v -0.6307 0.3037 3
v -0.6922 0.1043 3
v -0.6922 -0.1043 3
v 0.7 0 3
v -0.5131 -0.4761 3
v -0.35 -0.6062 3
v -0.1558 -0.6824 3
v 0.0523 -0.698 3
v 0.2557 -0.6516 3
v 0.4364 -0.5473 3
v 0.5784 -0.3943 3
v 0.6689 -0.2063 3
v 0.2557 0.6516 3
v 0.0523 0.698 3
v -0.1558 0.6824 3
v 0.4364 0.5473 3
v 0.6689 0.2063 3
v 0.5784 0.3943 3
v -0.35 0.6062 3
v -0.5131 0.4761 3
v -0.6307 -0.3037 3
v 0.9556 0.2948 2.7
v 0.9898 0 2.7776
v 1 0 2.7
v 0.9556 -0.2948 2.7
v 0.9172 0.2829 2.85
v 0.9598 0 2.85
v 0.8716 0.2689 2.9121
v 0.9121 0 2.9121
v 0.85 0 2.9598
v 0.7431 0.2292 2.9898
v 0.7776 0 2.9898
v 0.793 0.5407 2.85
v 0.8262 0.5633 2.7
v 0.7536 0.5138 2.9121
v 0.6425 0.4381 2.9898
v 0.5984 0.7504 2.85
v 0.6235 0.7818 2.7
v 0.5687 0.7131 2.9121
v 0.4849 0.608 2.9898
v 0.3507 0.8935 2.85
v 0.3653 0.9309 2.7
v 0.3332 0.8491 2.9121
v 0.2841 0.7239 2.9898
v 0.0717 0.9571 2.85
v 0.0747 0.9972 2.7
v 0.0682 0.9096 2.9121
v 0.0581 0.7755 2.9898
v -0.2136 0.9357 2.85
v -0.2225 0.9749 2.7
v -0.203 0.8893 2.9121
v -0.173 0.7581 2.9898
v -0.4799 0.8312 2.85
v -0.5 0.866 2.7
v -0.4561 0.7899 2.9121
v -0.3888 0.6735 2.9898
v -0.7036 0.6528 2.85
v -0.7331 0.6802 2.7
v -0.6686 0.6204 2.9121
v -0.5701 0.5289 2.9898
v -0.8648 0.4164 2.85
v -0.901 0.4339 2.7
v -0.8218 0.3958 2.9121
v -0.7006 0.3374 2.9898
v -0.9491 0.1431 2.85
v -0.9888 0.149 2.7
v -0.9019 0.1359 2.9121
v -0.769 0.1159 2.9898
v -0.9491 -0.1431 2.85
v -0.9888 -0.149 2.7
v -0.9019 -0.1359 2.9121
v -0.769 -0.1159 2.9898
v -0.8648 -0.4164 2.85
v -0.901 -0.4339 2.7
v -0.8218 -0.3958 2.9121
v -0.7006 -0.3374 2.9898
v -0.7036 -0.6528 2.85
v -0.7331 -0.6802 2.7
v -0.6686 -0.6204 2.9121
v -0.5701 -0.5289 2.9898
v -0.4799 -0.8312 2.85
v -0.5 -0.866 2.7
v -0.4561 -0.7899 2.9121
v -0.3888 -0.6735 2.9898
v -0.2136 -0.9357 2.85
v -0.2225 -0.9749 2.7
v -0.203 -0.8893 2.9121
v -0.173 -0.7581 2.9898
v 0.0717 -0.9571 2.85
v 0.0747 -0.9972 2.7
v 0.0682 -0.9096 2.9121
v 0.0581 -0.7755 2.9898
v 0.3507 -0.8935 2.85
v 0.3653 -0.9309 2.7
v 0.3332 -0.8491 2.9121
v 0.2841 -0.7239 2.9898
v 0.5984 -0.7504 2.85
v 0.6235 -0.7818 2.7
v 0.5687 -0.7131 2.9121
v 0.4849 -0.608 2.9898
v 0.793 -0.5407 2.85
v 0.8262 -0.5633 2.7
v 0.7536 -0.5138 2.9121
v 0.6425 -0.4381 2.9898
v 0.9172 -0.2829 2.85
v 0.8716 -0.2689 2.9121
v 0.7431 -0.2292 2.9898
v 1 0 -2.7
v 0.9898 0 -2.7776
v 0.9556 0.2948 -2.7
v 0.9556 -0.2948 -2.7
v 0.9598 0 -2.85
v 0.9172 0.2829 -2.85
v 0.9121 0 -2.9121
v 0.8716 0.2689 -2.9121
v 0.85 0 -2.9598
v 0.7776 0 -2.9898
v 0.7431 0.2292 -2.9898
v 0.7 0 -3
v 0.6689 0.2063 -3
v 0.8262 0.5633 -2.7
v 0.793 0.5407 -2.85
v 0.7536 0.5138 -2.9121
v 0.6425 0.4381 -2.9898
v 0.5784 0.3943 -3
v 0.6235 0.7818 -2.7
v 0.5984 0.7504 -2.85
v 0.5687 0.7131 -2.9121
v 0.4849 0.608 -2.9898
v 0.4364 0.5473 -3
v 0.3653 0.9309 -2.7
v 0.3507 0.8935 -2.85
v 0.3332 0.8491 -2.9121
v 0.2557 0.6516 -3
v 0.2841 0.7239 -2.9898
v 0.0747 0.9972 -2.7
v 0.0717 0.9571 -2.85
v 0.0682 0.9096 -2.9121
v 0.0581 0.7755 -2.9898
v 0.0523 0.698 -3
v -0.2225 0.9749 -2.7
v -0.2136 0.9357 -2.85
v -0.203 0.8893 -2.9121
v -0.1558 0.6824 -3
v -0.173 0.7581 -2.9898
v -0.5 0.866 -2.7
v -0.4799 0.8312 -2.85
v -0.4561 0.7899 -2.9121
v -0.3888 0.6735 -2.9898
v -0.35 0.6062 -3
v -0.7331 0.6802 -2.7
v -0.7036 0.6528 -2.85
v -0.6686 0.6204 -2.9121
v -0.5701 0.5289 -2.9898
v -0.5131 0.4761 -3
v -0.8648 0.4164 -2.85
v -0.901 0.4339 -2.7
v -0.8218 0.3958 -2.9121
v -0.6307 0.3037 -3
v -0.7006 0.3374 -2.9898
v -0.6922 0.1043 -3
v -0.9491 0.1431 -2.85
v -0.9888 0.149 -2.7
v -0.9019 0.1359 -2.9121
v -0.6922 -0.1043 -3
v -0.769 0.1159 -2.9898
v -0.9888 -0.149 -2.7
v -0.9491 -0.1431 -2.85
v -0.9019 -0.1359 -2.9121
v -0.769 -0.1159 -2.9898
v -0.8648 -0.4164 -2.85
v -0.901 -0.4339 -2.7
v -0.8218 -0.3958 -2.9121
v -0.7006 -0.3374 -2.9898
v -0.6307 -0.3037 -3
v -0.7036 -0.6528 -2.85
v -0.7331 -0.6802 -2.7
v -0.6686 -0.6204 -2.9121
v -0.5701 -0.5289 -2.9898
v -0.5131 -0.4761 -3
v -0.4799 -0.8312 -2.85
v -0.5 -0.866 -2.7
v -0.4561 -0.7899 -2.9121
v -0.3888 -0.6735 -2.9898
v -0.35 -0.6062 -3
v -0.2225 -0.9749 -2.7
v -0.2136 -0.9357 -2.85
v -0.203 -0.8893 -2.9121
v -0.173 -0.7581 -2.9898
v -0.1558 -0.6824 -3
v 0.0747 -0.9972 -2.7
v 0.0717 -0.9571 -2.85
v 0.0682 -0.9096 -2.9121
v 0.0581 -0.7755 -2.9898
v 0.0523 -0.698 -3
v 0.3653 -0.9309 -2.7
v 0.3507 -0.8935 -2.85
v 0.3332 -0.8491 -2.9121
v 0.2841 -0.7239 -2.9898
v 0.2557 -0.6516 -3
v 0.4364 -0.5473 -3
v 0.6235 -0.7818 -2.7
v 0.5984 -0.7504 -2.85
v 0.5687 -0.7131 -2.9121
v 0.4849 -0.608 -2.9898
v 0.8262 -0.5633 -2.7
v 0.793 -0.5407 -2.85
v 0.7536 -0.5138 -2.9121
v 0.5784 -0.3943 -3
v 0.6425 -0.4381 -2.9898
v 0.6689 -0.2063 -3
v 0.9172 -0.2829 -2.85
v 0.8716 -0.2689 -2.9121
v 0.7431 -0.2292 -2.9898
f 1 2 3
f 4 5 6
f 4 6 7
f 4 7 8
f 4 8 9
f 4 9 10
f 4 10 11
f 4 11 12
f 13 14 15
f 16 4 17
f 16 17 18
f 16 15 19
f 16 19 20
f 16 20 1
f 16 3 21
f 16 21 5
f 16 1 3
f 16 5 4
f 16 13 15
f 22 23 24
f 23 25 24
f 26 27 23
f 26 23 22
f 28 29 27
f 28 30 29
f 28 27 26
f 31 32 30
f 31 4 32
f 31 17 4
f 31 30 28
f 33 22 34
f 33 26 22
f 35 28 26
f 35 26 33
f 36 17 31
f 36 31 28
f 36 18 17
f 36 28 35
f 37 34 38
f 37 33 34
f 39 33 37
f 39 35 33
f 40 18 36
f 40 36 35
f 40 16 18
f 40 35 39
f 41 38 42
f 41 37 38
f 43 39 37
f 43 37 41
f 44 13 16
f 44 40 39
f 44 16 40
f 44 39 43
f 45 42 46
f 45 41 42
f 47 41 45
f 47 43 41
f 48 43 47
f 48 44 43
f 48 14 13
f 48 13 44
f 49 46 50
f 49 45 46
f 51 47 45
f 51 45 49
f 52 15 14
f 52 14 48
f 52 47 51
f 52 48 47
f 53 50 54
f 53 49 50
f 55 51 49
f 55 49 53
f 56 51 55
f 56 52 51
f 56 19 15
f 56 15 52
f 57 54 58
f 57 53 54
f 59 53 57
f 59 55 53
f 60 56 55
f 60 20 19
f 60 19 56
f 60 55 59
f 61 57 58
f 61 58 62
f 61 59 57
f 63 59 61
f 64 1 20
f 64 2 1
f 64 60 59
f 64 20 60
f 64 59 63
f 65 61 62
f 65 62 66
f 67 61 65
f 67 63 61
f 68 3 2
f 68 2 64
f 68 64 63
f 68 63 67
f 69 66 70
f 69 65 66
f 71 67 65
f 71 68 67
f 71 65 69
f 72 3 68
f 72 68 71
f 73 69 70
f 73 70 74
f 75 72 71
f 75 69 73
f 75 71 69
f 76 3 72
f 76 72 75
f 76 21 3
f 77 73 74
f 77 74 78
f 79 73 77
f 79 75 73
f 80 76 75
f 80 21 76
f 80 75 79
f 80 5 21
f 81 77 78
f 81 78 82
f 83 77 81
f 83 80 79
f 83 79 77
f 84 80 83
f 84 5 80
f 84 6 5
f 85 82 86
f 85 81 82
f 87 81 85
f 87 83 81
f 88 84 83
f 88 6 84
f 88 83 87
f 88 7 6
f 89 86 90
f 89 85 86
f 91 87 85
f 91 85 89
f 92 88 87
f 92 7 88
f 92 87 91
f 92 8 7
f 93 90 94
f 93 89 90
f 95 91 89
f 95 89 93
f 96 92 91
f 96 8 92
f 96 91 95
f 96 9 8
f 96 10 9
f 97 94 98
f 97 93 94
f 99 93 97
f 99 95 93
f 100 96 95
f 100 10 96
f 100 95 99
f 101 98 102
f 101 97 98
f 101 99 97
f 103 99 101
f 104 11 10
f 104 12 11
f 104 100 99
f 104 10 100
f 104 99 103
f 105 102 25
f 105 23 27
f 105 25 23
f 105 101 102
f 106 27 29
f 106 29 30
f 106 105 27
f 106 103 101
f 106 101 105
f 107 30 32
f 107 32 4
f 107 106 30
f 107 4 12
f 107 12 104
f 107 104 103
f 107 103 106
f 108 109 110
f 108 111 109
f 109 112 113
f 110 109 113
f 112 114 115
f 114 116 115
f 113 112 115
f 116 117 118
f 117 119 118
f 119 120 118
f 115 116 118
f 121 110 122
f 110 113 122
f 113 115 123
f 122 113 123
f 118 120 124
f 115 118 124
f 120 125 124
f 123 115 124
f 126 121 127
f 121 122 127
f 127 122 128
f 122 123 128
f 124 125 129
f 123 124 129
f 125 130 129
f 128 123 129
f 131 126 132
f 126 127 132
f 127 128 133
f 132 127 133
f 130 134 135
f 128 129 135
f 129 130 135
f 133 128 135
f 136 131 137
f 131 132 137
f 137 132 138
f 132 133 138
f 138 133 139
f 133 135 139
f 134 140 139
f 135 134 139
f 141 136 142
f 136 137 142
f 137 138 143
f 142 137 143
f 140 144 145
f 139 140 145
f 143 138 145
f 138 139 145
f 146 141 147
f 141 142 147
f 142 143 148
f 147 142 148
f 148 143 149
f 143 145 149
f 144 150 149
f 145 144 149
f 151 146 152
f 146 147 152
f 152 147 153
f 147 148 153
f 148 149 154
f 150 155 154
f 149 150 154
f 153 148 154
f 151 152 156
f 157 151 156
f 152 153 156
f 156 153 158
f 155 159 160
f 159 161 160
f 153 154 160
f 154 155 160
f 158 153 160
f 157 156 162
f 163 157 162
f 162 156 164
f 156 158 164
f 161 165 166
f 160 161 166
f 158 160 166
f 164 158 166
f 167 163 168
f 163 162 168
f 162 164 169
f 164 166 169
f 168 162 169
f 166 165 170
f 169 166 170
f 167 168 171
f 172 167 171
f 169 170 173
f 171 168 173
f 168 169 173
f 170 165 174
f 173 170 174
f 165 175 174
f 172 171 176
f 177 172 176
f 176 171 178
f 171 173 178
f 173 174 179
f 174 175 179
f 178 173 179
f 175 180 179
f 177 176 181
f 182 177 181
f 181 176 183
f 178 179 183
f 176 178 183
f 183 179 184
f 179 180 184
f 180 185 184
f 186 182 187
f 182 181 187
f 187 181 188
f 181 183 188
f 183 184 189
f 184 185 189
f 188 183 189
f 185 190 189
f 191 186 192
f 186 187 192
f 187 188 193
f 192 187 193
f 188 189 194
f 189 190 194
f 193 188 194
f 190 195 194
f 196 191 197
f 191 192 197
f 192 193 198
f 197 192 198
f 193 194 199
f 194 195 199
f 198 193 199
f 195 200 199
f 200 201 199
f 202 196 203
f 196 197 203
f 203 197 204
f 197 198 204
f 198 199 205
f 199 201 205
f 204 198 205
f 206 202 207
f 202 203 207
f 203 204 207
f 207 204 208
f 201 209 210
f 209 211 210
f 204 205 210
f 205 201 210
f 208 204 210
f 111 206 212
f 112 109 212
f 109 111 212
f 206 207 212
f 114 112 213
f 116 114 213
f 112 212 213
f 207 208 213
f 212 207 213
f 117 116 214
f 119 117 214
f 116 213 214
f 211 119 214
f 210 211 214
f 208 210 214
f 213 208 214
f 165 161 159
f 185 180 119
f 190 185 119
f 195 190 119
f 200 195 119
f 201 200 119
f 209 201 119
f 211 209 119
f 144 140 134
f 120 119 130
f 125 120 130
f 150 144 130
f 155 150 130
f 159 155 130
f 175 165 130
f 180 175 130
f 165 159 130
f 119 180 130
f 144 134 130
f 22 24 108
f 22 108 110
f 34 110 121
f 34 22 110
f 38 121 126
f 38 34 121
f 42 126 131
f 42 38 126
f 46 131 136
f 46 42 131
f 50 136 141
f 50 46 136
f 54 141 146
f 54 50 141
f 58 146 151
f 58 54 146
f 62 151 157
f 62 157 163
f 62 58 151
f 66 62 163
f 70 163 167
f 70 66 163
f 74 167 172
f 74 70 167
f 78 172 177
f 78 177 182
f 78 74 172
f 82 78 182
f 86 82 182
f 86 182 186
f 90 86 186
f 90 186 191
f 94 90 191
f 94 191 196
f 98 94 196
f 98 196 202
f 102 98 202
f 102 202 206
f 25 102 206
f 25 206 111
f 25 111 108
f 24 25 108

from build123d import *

# Parameters (mm, degrees)
SKETCH_1_R      = 1
EXTRUDE_1_DEPTH = 3
FILLET_1_R      = 0.3
FILLET_2_R      = 0.3


with BuildPart() as part:
    # 草图1 → 拉伸1 (new, symmetric)
    with BuildSketch(Plane.XY):
        Circle(SKETCH_1_R)
    extrude(amount=EXTRUDE_1_DEPTH, both=True)

    # 圆角1
    fillet_1_edges = [part.edges().sort_by_distance(p)[0] for p in [
        (-1, 0, 3),
    ]]
    fillet(fillet_1_edges, radius=FILLET_1_R)

    # 圆角2
    fillet_2_edges = [part.edges().sort_by_distance(p)[0] for p in [
        (-1, 0, -3),
    ]]
    fillet(fillet_2_edges, radius=FILLET_2_R)


solid = part.part
